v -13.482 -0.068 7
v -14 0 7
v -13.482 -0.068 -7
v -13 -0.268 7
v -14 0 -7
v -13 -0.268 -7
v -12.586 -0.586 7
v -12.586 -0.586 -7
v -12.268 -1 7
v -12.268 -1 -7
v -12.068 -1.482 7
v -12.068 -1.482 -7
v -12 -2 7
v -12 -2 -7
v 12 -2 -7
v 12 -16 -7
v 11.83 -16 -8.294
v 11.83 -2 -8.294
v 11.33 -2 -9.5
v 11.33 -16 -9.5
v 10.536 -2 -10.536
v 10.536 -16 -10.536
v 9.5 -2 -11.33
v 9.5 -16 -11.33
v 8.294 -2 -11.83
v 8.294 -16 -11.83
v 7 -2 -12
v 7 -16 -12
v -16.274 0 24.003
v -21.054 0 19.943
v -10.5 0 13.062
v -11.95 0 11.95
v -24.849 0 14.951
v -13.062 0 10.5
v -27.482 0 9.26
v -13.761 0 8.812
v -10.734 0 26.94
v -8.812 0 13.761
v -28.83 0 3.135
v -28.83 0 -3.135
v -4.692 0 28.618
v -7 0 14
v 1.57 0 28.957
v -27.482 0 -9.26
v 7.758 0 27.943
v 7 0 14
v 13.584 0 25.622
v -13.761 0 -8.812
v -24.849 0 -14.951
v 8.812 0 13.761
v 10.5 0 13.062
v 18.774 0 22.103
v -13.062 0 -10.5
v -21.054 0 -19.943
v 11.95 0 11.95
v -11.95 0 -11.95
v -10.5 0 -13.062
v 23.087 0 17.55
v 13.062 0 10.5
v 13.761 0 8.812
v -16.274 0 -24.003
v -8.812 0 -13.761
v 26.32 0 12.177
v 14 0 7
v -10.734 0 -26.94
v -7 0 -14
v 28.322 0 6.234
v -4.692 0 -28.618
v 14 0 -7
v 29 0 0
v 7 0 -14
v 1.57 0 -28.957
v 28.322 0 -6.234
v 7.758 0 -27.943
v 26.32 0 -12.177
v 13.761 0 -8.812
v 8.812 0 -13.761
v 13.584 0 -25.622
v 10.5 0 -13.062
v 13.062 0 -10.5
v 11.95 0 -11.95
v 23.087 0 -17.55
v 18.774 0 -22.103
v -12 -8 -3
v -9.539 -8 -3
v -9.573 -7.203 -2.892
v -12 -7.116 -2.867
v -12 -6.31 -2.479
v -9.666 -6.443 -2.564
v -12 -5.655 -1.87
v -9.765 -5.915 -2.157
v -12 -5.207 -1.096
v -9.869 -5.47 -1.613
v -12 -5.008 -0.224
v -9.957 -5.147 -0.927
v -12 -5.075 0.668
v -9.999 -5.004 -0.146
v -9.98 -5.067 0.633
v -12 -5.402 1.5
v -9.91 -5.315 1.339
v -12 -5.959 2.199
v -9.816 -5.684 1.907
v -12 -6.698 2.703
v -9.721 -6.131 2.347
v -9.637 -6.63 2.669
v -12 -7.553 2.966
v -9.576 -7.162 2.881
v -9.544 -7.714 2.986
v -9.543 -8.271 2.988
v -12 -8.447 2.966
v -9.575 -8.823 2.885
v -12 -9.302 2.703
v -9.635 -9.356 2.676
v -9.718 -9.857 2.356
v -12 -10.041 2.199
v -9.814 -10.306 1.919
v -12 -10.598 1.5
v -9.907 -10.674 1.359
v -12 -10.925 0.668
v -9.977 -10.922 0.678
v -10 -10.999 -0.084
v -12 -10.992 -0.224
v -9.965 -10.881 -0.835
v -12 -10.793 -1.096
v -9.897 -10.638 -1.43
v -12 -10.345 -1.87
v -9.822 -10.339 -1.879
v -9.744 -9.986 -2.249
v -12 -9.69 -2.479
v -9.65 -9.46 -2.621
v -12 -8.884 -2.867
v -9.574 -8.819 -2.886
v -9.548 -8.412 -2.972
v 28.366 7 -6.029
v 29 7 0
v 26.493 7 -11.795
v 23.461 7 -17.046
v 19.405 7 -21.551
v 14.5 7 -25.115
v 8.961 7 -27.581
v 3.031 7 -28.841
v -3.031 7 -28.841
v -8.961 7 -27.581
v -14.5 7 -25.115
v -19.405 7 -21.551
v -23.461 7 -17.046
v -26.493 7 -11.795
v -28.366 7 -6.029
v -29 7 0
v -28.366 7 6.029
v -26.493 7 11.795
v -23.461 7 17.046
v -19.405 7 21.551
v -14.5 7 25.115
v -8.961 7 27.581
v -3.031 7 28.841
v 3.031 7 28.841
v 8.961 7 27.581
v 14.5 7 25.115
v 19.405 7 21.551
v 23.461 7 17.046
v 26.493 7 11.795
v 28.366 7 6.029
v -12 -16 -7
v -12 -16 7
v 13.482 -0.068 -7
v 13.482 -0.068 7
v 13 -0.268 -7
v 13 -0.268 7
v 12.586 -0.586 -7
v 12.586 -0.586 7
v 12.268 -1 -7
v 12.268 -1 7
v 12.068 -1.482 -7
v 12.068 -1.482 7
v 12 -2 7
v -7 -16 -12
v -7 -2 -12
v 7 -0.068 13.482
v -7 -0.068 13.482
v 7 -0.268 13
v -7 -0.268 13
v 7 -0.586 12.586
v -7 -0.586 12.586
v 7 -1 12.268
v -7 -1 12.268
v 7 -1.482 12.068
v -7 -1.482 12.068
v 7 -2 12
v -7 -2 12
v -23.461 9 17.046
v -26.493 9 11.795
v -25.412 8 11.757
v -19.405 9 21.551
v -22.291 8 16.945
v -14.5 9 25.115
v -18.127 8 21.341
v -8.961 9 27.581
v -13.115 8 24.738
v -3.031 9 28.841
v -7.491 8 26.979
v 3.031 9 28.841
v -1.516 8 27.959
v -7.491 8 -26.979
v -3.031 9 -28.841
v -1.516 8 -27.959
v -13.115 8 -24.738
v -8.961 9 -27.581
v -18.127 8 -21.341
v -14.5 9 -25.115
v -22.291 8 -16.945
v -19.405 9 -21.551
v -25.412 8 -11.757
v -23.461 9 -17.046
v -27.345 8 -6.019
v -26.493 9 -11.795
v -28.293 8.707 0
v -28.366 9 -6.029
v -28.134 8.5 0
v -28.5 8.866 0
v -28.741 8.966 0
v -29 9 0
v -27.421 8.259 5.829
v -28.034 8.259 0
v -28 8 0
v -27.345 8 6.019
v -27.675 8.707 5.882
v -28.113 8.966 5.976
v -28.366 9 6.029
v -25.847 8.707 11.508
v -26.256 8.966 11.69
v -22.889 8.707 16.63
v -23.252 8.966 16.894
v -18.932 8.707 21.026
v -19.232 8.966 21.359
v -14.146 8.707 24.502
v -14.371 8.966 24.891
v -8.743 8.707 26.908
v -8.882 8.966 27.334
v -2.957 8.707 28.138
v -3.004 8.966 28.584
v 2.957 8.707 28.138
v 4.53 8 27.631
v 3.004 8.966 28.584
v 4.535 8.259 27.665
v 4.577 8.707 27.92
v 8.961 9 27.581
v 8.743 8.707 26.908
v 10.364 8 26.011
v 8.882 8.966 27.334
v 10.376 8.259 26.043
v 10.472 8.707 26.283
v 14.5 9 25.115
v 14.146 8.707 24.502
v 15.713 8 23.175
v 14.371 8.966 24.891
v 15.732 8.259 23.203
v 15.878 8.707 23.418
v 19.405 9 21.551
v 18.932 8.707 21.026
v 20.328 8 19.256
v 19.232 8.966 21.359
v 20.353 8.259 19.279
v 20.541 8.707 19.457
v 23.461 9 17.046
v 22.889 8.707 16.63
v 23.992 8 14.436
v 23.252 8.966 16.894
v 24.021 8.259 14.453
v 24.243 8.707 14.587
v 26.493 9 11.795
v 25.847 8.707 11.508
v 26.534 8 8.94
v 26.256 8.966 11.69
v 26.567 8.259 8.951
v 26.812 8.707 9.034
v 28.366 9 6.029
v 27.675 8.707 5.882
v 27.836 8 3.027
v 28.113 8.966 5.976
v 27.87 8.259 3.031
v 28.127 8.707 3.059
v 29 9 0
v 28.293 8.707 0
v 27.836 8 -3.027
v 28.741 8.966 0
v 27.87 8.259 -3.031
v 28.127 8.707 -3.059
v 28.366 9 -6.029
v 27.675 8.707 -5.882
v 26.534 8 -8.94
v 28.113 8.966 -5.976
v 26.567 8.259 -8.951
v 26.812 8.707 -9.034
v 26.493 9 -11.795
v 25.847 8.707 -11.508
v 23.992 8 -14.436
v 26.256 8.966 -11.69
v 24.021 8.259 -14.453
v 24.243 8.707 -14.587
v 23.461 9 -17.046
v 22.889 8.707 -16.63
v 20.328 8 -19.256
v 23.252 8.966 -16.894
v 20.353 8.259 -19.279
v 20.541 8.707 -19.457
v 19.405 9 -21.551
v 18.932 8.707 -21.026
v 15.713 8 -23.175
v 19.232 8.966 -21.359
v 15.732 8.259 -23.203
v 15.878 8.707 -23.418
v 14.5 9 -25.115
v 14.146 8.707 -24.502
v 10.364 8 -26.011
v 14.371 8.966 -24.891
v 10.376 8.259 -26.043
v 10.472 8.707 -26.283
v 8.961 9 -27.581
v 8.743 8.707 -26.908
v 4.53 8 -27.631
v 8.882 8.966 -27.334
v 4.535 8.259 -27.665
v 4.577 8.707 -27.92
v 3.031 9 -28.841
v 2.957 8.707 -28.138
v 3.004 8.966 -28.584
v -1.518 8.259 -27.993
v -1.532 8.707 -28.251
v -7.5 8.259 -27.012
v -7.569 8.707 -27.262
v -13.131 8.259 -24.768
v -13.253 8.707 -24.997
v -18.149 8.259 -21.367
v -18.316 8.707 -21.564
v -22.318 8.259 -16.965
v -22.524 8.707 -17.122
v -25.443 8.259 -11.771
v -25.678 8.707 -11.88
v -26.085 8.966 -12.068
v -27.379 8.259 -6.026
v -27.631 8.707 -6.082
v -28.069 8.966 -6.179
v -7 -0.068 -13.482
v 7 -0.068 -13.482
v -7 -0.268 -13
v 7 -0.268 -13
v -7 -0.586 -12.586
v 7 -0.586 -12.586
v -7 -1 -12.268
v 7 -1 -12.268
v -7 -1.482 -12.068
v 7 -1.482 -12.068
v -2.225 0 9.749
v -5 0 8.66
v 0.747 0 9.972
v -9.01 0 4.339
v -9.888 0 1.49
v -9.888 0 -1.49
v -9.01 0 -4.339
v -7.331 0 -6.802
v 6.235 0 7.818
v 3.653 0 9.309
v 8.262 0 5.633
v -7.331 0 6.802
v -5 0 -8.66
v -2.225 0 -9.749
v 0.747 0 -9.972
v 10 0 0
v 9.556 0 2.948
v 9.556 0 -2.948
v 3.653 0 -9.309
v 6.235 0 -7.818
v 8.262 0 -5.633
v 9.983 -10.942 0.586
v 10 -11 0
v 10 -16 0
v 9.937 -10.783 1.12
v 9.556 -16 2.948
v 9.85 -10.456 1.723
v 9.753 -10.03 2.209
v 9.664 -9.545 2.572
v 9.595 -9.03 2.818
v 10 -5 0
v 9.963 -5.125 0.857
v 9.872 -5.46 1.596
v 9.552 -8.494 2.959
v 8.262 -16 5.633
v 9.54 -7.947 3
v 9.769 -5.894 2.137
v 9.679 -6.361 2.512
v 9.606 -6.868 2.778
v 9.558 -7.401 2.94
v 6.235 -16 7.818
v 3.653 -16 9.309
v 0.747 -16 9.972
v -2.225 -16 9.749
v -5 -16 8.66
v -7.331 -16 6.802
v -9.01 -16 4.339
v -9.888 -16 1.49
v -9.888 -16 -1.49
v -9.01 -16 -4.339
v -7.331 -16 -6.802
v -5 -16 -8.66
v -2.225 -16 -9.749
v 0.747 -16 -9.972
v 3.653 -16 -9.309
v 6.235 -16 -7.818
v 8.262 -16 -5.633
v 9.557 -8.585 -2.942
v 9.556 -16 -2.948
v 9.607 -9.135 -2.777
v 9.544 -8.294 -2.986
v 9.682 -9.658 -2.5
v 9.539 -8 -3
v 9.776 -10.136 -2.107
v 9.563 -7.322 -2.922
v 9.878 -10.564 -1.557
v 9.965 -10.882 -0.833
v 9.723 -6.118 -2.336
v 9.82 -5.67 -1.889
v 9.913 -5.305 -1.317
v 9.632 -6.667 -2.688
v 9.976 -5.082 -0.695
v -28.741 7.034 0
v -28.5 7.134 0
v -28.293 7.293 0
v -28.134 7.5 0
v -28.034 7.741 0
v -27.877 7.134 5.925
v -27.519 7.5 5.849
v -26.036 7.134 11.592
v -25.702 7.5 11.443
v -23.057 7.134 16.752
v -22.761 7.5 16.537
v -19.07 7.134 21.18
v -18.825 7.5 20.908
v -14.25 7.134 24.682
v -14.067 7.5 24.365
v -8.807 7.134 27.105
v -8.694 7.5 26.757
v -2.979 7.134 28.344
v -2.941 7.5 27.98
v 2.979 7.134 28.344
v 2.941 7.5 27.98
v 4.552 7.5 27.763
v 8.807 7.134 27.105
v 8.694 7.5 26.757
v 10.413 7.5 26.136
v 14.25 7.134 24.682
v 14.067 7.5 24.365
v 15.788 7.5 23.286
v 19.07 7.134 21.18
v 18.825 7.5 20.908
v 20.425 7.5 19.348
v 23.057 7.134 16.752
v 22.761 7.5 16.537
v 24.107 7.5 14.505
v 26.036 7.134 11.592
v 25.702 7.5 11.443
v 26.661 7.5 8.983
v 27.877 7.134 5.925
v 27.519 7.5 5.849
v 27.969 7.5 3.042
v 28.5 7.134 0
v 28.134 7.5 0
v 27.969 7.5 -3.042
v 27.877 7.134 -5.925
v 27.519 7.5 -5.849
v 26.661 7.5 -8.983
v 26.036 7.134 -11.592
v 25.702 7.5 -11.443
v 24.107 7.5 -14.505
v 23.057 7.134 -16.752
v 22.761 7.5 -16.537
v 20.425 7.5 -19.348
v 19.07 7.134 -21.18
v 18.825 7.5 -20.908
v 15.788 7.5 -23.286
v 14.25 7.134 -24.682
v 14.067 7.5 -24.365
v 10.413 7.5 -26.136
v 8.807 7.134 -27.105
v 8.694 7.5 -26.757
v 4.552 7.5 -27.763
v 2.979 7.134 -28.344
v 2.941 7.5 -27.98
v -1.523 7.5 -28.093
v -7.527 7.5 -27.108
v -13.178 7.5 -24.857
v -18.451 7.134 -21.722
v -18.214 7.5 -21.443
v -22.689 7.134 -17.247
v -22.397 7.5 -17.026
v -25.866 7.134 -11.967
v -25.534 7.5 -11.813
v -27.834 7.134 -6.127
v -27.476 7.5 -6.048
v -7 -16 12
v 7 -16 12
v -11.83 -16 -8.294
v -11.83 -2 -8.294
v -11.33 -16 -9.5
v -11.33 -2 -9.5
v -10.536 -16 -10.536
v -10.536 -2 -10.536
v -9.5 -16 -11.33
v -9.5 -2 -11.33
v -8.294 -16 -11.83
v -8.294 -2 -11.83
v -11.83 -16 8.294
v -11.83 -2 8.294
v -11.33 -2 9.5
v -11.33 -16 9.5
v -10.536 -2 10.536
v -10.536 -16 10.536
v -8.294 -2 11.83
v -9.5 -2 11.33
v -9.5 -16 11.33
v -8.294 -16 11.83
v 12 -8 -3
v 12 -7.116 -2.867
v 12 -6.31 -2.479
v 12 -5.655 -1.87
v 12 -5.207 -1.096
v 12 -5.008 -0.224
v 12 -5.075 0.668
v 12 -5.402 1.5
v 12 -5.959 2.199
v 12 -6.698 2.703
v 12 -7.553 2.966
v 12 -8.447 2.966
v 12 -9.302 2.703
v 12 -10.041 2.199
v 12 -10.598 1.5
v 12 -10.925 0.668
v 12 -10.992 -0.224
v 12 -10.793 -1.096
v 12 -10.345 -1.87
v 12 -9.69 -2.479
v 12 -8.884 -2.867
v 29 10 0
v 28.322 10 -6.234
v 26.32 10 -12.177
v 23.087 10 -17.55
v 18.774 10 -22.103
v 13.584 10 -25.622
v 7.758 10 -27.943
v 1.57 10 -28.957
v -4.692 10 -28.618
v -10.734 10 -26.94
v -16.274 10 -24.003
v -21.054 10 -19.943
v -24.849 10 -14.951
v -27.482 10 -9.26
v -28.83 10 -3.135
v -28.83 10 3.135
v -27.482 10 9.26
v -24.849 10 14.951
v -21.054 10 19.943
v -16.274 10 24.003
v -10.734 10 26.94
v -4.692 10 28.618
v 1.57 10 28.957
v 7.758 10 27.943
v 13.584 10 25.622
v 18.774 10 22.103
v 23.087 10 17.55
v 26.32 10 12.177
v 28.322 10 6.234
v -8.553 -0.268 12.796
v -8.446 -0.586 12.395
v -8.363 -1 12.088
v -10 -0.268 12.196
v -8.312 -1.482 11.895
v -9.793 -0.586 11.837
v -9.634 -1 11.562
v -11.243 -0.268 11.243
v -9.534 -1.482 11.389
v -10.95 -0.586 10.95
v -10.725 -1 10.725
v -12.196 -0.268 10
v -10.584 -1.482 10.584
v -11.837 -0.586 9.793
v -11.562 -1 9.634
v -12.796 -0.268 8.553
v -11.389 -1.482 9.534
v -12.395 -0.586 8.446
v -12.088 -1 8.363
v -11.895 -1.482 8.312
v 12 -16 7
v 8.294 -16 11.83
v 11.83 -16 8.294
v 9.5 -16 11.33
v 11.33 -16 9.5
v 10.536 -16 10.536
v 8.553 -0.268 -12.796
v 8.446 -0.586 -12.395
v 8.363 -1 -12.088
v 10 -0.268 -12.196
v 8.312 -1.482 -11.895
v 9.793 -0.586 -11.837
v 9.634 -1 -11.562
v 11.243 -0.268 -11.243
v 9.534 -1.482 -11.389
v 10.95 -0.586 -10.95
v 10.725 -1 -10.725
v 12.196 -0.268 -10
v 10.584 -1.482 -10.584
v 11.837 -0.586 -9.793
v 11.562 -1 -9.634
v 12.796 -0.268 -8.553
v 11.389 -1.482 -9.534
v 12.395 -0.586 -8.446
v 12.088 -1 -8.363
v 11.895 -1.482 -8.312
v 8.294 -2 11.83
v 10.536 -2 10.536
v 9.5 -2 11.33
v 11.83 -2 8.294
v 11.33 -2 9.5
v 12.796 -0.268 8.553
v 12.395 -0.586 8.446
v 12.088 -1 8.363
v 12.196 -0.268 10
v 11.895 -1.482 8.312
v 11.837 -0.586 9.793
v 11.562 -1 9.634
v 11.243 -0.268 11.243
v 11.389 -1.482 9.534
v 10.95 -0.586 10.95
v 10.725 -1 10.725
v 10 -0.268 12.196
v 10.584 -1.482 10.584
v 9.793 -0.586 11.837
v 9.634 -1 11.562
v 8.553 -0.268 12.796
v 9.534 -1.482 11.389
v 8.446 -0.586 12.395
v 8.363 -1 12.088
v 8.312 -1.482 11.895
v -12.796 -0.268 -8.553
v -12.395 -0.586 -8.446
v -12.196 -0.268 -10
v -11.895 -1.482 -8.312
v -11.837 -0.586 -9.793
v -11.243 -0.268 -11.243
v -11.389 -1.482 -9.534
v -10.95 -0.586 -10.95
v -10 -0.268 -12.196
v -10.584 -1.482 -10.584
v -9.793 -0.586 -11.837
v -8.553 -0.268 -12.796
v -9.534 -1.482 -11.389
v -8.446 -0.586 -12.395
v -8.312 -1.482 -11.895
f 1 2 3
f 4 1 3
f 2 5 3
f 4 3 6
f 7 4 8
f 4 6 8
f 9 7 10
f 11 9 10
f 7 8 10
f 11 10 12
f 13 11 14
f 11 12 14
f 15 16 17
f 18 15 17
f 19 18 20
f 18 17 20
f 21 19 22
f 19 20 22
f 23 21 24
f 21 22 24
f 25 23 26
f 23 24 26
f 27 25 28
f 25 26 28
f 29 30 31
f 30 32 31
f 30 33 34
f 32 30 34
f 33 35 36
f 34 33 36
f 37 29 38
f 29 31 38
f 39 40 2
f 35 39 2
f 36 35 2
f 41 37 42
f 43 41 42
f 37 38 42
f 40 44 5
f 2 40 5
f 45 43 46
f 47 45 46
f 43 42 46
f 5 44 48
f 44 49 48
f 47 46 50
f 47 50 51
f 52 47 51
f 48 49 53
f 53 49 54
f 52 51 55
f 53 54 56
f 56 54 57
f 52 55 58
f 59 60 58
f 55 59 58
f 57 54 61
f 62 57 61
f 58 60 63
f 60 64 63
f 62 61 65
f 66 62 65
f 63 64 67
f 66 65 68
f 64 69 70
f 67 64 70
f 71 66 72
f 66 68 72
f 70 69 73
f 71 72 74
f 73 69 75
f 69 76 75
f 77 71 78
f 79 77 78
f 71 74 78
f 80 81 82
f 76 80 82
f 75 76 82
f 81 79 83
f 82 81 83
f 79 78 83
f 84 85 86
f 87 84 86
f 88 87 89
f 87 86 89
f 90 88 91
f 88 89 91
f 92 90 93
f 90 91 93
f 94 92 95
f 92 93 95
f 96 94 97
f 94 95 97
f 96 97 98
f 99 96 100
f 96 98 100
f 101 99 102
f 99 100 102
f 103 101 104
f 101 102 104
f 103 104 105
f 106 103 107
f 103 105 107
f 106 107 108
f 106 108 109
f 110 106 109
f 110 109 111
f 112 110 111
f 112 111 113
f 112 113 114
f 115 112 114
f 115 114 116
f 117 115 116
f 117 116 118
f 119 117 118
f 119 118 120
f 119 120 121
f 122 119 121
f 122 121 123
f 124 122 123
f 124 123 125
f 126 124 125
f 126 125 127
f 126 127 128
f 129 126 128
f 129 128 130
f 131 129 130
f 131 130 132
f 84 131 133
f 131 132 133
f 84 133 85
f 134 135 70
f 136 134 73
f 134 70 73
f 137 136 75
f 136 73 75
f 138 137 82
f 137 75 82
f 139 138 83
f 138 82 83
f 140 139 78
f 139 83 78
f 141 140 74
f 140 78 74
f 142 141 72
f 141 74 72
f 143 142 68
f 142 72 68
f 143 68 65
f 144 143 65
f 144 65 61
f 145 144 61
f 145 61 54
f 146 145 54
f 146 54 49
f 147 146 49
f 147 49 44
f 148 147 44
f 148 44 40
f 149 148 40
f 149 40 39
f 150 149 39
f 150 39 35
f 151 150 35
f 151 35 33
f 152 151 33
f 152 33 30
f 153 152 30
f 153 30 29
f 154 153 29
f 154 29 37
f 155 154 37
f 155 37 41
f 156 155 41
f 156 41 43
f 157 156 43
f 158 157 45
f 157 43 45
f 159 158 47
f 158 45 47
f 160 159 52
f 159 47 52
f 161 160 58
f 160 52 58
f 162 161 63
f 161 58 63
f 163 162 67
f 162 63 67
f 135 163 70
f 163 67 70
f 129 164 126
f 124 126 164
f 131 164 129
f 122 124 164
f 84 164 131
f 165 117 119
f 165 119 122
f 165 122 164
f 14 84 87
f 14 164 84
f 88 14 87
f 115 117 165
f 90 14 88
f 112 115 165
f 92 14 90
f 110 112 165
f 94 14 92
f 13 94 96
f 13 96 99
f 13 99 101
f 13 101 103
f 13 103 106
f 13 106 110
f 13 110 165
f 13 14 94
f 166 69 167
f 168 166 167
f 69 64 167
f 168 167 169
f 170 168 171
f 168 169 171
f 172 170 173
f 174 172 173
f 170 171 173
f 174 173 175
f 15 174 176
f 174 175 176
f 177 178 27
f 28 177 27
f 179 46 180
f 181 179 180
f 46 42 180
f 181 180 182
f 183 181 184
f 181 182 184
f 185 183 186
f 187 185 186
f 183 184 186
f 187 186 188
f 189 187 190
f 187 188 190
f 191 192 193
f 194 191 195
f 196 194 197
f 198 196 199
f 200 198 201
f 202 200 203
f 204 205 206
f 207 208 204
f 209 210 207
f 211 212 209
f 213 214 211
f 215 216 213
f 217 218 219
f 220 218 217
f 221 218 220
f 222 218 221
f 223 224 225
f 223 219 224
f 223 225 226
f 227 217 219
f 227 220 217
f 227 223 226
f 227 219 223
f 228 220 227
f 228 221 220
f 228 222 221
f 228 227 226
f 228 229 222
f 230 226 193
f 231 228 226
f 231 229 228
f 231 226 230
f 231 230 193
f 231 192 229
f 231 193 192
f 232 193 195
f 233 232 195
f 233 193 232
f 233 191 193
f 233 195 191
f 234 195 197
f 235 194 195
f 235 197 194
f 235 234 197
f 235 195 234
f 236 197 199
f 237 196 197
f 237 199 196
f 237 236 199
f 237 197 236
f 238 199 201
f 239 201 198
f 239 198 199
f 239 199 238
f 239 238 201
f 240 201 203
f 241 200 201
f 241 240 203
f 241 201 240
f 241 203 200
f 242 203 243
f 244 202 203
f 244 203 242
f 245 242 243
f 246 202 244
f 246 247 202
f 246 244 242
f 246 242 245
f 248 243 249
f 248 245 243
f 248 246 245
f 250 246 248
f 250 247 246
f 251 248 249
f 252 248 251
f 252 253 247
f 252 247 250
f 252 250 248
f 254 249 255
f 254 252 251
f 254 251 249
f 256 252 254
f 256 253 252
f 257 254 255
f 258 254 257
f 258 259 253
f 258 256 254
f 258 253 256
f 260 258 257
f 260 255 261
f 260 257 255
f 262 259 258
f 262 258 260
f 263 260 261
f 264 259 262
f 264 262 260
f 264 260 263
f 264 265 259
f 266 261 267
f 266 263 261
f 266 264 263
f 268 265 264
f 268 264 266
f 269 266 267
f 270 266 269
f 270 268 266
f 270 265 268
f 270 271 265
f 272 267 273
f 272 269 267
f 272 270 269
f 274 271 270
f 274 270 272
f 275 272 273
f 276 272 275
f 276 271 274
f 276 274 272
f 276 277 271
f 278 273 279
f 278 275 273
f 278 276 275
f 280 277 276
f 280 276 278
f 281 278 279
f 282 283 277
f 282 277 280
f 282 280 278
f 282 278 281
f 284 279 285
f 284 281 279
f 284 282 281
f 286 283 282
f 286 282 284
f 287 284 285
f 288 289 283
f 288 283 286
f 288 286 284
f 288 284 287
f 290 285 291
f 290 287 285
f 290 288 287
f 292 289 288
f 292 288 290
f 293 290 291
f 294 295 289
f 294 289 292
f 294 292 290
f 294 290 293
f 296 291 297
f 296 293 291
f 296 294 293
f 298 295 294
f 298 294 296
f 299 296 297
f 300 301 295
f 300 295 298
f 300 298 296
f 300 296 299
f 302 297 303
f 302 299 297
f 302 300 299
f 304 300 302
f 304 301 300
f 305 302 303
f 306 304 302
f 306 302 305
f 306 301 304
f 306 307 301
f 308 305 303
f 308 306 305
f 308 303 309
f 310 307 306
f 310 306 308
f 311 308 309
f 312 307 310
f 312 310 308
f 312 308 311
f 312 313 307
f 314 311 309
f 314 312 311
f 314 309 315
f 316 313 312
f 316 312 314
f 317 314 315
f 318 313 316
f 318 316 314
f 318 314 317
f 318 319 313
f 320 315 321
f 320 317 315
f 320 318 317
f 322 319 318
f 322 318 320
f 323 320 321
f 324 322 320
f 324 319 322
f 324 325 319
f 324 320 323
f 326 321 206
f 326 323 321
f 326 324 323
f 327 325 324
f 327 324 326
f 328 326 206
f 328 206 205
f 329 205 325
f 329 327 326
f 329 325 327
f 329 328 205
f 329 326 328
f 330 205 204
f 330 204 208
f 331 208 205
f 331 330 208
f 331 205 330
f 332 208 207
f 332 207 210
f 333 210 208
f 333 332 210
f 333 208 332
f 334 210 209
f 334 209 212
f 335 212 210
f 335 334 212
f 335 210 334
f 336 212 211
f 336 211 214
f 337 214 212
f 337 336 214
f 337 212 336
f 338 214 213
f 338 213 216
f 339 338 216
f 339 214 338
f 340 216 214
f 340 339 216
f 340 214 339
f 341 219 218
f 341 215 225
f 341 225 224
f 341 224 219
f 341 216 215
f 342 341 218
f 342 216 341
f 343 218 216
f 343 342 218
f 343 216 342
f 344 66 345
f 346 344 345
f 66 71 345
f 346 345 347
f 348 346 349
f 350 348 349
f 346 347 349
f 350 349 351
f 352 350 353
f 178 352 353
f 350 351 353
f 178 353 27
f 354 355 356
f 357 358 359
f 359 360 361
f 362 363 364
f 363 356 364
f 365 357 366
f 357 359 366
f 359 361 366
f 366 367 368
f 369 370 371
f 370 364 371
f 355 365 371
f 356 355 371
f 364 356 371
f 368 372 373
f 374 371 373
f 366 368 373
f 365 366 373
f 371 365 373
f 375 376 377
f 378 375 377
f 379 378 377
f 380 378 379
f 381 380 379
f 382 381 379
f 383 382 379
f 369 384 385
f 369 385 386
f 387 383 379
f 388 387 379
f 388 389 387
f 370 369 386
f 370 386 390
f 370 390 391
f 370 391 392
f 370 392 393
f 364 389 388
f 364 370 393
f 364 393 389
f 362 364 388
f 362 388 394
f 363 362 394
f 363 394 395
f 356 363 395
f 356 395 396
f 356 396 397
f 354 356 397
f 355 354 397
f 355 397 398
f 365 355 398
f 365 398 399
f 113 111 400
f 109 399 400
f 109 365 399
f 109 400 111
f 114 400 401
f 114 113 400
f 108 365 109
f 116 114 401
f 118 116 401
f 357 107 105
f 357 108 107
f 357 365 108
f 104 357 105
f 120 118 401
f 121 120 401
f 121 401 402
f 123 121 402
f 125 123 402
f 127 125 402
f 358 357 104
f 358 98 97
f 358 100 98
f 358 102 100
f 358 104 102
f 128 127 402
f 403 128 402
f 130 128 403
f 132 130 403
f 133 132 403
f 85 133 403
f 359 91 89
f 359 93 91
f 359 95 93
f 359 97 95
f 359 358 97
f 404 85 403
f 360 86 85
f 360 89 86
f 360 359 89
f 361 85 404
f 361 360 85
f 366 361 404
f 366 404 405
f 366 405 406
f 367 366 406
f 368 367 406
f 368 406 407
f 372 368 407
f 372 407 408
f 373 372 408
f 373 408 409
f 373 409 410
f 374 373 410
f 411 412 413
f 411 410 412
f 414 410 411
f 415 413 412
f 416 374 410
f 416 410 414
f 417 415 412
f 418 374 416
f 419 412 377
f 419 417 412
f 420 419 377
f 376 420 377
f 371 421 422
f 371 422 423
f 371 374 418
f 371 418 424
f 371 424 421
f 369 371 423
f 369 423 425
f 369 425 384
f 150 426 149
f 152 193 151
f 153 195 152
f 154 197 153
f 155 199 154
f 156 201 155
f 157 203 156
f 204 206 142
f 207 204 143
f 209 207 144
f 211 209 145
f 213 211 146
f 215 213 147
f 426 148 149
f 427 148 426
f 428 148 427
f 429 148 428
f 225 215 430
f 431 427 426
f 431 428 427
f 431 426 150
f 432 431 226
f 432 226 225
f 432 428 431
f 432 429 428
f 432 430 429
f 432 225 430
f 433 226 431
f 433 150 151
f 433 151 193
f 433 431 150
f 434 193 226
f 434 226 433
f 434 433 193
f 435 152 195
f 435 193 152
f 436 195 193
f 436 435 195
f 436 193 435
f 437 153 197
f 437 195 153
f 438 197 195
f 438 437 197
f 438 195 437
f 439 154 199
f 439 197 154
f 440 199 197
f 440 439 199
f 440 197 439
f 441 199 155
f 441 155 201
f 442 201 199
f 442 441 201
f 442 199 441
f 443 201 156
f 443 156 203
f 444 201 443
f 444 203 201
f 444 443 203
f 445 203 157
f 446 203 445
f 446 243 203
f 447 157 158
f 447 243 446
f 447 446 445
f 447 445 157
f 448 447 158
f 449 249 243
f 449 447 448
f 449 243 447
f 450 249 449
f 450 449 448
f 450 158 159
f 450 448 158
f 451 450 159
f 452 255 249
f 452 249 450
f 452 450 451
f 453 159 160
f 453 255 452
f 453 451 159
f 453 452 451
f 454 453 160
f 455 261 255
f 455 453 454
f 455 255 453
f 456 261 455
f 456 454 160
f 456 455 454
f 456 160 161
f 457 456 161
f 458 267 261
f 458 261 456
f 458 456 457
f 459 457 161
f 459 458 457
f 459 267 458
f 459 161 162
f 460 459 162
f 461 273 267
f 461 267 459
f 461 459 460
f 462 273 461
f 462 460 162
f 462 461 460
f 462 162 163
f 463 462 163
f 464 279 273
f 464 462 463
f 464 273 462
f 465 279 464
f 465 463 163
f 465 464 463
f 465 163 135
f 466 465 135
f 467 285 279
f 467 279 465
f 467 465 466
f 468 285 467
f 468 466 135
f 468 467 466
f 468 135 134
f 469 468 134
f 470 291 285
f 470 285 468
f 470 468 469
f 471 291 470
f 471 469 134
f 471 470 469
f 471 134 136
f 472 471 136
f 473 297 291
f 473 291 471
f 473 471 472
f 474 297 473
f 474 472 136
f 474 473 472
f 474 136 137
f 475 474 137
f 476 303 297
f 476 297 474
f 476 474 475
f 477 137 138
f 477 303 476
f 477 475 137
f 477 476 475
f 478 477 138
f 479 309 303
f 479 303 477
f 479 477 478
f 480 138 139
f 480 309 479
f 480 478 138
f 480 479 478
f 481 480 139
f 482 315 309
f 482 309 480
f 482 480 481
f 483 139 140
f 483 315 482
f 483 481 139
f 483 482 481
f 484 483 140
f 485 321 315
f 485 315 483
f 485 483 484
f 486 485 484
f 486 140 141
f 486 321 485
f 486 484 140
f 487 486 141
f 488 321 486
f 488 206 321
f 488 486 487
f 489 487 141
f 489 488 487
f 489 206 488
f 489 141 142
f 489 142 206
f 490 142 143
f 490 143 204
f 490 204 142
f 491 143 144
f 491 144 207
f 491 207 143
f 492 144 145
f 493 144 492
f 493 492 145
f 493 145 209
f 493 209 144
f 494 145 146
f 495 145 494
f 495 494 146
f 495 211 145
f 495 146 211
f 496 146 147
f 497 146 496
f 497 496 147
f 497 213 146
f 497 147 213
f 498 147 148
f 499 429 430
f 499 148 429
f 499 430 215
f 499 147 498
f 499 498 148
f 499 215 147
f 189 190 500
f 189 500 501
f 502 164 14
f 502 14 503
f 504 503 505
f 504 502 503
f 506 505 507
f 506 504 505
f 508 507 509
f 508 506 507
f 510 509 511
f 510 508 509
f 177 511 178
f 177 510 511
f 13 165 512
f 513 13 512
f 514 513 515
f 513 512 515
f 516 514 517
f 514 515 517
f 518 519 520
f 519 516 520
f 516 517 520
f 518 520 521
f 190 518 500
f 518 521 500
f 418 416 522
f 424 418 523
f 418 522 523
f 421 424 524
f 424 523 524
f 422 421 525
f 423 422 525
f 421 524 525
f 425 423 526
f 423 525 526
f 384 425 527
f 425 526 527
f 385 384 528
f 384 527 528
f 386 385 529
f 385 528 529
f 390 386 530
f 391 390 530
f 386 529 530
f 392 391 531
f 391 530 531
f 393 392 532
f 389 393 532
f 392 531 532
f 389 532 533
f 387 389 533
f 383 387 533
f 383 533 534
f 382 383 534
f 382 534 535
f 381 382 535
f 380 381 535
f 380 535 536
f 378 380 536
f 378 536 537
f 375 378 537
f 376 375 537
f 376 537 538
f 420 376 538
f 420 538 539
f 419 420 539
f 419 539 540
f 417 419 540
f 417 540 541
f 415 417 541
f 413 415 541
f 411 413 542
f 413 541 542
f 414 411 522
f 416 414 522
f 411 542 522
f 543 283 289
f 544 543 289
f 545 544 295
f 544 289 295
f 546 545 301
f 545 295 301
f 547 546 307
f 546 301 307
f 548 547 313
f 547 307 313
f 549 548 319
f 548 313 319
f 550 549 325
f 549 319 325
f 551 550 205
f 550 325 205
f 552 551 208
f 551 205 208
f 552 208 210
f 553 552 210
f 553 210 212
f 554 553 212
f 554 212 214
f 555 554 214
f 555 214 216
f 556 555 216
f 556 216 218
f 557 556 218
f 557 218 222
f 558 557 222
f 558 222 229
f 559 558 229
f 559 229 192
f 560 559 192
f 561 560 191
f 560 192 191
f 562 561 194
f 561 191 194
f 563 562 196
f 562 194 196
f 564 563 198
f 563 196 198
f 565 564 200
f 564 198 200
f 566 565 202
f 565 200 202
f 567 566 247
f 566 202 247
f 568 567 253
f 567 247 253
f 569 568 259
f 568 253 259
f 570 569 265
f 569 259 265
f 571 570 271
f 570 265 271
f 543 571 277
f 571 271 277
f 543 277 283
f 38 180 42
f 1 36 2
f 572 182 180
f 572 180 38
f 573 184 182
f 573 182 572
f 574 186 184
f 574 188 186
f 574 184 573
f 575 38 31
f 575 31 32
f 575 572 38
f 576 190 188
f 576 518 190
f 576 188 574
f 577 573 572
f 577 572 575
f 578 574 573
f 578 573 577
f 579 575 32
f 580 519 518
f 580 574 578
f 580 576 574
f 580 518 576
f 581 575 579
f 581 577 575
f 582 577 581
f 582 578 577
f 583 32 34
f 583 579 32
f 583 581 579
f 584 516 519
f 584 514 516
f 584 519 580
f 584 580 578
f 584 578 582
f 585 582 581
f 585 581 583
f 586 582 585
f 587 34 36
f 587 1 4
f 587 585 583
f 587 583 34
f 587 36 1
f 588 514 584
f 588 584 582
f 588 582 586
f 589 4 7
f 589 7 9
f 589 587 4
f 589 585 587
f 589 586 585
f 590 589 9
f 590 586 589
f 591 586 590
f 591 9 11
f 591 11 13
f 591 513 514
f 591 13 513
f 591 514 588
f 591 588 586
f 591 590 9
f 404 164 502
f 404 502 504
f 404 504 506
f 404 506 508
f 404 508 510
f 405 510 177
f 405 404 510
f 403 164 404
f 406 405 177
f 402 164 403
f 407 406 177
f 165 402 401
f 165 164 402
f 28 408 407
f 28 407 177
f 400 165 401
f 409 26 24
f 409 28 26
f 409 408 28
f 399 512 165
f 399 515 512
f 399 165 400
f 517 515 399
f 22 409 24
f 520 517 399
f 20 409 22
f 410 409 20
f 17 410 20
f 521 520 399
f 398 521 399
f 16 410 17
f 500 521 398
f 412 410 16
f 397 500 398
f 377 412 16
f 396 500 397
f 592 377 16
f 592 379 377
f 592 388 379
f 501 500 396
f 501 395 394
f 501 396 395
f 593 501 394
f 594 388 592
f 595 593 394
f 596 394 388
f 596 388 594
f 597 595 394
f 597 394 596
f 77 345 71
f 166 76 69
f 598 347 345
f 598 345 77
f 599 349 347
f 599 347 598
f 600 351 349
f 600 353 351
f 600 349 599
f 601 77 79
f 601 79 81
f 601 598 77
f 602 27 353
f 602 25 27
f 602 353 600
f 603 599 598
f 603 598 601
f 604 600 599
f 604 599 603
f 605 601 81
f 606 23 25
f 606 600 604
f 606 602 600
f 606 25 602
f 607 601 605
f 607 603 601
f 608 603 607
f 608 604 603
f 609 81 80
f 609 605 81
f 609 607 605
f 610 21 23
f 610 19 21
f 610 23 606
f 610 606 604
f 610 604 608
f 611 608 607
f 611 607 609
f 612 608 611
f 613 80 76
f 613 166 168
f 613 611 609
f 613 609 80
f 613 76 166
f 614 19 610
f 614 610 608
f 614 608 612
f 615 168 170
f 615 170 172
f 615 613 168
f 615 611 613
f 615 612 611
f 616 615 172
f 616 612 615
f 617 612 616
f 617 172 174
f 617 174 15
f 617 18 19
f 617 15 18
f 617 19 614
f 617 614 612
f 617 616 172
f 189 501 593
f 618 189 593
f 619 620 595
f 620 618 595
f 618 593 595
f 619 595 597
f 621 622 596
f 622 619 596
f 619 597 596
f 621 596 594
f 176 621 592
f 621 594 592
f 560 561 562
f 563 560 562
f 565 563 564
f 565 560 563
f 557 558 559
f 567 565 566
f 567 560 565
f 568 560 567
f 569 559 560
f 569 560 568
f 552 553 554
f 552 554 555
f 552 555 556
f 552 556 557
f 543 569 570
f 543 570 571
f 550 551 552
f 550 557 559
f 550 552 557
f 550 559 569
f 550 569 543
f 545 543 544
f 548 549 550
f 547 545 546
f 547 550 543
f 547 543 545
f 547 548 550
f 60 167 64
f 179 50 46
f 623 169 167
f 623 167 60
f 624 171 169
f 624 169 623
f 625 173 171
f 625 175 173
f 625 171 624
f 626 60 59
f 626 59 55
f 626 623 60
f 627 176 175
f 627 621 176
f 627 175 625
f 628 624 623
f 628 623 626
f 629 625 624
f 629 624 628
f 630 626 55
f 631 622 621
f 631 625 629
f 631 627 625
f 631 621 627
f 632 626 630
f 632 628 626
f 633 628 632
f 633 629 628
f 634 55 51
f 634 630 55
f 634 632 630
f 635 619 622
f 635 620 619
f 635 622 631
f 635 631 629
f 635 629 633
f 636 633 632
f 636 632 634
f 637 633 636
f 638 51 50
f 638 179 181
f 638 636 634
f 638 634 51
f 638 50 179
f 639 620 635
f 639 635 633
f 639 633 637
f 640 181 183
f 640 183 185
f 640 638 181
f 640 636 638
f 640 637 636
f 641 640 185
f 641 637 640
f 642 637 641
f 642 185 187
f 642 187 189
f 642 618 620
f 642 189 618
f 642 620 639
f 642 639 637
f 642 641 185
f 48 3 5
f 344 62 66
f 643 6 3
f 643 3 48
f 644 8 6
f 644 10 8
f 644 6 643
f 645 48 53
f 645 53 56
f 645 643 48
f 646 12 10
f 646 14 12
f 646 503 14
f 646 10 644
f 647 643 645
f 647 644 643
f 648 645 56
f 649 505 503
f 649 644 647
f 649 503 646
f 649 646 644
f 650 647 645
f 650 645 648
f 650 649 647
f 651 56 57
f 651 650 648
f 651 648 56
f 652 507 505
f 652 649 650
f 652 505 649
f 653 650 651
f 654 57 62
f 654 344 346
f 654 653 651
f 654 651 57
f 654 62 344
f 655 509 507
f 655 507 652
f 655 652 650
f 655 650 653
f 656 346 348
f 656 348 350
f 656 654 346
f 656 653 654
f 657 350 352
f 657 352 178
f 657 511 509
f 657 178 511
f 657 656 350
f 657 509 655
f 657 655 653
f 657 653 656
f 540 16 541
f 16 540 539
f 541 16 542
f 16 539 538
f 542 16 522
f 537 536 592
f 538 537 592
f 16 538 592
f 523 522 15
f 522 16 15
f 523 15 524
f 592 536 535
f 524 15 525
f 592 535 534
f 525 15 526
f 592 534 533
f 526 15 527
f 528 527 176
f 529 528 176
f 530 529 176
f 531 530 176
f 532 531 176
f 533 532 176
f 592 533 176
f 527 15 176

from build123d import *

# Parameters (mm, degrees)
SKETCH1_R           = 29
BOSS_EXTRUDE1_DEPTH = 10
SKETCH2_W           = 24
SKETCH2_H           = 24
SKETCH2_R           = 10
BOSS_EXTRUDE2_DEPTH = 16
SKETCH3_R           = 3
CUT_EXTRUDE1_DEPTH  = 42
FILLET1_R           = 5
FILLET2_R           = 2
SKETCH4_R           = 1


with BuildPart() as part:
    # Sketch1 → Boss-Extrude1 (new body)
    with BuildSketch(Plane(origin=(0, 0, 0), x_dir=(1, 0, 0), z_dir=(0, 1, 0))):
        Circle(SKETCH1_R)
    extrude(amount=BOSS_EXTRUDE1_DEPTH)

    # Sketch2 → Boss-Extrude2 (add)
    with BuildSketch(Plane.XZ):
        Rectangle(SKETCH2_W, SKETCH2_H)
        Circle(SKETCH2_R, mode=Mode.SUBTRACT)
    extrude(amount=BOSS_EXTRUDE2_DEPTH)

    # Sketch3 → Cut-Extrude1 (cut, through all)
    with BuildSketch(Plane(origin=(12, 0, 0), x_dir=(0, 0, -1), z_dir=(1, 0, 0))):
        with Locations((0, -8)):
            Circle(SKETCH3_R)
    extrude(amount=-CUT_EXTRUDE1_DEPTH, mode=Mode.SUBTRACT)

    # Fillet1
    fillet1_edges = [part.edges().sort_by_distance(p)[0] for p in [
        (12, -8, -12),
        (12, -8, 12),
        (-12, -8, 12),
        (-12, -8, -12),
    ]]
    fillet(fillet1_edges, radius=FILLET1_R)

    # Fillet2
    fillet2_edges = [part.edges().sort_by_distance(p)[0] for p in [
        (0, 0, -12),
        (-12, 0, 0),
        (12, 0, 0),
        (0, 0, 12),
        (-10.535533906, 0, -10.535533906),
        (10.535533906, 0, -10.535533906),
        (10.535533906, 0, 10.535533906),
        (-10.535533906, 0, 10.535533906),
    ]]
    fillet(fillet2_edges, radius=FILLET2_R)

    # Sketch4 → Cut-Revolve1 (revolve, cut)
    with BuildSketch(Plane.XY):
        with Locations((-29, 8)):
            Circle(SKETCH4_R)
    revolve(axis=Axis((0, 0, 0), (0, 1, 0)), mode=Mode.SUBTRACT)


solid = part.part
